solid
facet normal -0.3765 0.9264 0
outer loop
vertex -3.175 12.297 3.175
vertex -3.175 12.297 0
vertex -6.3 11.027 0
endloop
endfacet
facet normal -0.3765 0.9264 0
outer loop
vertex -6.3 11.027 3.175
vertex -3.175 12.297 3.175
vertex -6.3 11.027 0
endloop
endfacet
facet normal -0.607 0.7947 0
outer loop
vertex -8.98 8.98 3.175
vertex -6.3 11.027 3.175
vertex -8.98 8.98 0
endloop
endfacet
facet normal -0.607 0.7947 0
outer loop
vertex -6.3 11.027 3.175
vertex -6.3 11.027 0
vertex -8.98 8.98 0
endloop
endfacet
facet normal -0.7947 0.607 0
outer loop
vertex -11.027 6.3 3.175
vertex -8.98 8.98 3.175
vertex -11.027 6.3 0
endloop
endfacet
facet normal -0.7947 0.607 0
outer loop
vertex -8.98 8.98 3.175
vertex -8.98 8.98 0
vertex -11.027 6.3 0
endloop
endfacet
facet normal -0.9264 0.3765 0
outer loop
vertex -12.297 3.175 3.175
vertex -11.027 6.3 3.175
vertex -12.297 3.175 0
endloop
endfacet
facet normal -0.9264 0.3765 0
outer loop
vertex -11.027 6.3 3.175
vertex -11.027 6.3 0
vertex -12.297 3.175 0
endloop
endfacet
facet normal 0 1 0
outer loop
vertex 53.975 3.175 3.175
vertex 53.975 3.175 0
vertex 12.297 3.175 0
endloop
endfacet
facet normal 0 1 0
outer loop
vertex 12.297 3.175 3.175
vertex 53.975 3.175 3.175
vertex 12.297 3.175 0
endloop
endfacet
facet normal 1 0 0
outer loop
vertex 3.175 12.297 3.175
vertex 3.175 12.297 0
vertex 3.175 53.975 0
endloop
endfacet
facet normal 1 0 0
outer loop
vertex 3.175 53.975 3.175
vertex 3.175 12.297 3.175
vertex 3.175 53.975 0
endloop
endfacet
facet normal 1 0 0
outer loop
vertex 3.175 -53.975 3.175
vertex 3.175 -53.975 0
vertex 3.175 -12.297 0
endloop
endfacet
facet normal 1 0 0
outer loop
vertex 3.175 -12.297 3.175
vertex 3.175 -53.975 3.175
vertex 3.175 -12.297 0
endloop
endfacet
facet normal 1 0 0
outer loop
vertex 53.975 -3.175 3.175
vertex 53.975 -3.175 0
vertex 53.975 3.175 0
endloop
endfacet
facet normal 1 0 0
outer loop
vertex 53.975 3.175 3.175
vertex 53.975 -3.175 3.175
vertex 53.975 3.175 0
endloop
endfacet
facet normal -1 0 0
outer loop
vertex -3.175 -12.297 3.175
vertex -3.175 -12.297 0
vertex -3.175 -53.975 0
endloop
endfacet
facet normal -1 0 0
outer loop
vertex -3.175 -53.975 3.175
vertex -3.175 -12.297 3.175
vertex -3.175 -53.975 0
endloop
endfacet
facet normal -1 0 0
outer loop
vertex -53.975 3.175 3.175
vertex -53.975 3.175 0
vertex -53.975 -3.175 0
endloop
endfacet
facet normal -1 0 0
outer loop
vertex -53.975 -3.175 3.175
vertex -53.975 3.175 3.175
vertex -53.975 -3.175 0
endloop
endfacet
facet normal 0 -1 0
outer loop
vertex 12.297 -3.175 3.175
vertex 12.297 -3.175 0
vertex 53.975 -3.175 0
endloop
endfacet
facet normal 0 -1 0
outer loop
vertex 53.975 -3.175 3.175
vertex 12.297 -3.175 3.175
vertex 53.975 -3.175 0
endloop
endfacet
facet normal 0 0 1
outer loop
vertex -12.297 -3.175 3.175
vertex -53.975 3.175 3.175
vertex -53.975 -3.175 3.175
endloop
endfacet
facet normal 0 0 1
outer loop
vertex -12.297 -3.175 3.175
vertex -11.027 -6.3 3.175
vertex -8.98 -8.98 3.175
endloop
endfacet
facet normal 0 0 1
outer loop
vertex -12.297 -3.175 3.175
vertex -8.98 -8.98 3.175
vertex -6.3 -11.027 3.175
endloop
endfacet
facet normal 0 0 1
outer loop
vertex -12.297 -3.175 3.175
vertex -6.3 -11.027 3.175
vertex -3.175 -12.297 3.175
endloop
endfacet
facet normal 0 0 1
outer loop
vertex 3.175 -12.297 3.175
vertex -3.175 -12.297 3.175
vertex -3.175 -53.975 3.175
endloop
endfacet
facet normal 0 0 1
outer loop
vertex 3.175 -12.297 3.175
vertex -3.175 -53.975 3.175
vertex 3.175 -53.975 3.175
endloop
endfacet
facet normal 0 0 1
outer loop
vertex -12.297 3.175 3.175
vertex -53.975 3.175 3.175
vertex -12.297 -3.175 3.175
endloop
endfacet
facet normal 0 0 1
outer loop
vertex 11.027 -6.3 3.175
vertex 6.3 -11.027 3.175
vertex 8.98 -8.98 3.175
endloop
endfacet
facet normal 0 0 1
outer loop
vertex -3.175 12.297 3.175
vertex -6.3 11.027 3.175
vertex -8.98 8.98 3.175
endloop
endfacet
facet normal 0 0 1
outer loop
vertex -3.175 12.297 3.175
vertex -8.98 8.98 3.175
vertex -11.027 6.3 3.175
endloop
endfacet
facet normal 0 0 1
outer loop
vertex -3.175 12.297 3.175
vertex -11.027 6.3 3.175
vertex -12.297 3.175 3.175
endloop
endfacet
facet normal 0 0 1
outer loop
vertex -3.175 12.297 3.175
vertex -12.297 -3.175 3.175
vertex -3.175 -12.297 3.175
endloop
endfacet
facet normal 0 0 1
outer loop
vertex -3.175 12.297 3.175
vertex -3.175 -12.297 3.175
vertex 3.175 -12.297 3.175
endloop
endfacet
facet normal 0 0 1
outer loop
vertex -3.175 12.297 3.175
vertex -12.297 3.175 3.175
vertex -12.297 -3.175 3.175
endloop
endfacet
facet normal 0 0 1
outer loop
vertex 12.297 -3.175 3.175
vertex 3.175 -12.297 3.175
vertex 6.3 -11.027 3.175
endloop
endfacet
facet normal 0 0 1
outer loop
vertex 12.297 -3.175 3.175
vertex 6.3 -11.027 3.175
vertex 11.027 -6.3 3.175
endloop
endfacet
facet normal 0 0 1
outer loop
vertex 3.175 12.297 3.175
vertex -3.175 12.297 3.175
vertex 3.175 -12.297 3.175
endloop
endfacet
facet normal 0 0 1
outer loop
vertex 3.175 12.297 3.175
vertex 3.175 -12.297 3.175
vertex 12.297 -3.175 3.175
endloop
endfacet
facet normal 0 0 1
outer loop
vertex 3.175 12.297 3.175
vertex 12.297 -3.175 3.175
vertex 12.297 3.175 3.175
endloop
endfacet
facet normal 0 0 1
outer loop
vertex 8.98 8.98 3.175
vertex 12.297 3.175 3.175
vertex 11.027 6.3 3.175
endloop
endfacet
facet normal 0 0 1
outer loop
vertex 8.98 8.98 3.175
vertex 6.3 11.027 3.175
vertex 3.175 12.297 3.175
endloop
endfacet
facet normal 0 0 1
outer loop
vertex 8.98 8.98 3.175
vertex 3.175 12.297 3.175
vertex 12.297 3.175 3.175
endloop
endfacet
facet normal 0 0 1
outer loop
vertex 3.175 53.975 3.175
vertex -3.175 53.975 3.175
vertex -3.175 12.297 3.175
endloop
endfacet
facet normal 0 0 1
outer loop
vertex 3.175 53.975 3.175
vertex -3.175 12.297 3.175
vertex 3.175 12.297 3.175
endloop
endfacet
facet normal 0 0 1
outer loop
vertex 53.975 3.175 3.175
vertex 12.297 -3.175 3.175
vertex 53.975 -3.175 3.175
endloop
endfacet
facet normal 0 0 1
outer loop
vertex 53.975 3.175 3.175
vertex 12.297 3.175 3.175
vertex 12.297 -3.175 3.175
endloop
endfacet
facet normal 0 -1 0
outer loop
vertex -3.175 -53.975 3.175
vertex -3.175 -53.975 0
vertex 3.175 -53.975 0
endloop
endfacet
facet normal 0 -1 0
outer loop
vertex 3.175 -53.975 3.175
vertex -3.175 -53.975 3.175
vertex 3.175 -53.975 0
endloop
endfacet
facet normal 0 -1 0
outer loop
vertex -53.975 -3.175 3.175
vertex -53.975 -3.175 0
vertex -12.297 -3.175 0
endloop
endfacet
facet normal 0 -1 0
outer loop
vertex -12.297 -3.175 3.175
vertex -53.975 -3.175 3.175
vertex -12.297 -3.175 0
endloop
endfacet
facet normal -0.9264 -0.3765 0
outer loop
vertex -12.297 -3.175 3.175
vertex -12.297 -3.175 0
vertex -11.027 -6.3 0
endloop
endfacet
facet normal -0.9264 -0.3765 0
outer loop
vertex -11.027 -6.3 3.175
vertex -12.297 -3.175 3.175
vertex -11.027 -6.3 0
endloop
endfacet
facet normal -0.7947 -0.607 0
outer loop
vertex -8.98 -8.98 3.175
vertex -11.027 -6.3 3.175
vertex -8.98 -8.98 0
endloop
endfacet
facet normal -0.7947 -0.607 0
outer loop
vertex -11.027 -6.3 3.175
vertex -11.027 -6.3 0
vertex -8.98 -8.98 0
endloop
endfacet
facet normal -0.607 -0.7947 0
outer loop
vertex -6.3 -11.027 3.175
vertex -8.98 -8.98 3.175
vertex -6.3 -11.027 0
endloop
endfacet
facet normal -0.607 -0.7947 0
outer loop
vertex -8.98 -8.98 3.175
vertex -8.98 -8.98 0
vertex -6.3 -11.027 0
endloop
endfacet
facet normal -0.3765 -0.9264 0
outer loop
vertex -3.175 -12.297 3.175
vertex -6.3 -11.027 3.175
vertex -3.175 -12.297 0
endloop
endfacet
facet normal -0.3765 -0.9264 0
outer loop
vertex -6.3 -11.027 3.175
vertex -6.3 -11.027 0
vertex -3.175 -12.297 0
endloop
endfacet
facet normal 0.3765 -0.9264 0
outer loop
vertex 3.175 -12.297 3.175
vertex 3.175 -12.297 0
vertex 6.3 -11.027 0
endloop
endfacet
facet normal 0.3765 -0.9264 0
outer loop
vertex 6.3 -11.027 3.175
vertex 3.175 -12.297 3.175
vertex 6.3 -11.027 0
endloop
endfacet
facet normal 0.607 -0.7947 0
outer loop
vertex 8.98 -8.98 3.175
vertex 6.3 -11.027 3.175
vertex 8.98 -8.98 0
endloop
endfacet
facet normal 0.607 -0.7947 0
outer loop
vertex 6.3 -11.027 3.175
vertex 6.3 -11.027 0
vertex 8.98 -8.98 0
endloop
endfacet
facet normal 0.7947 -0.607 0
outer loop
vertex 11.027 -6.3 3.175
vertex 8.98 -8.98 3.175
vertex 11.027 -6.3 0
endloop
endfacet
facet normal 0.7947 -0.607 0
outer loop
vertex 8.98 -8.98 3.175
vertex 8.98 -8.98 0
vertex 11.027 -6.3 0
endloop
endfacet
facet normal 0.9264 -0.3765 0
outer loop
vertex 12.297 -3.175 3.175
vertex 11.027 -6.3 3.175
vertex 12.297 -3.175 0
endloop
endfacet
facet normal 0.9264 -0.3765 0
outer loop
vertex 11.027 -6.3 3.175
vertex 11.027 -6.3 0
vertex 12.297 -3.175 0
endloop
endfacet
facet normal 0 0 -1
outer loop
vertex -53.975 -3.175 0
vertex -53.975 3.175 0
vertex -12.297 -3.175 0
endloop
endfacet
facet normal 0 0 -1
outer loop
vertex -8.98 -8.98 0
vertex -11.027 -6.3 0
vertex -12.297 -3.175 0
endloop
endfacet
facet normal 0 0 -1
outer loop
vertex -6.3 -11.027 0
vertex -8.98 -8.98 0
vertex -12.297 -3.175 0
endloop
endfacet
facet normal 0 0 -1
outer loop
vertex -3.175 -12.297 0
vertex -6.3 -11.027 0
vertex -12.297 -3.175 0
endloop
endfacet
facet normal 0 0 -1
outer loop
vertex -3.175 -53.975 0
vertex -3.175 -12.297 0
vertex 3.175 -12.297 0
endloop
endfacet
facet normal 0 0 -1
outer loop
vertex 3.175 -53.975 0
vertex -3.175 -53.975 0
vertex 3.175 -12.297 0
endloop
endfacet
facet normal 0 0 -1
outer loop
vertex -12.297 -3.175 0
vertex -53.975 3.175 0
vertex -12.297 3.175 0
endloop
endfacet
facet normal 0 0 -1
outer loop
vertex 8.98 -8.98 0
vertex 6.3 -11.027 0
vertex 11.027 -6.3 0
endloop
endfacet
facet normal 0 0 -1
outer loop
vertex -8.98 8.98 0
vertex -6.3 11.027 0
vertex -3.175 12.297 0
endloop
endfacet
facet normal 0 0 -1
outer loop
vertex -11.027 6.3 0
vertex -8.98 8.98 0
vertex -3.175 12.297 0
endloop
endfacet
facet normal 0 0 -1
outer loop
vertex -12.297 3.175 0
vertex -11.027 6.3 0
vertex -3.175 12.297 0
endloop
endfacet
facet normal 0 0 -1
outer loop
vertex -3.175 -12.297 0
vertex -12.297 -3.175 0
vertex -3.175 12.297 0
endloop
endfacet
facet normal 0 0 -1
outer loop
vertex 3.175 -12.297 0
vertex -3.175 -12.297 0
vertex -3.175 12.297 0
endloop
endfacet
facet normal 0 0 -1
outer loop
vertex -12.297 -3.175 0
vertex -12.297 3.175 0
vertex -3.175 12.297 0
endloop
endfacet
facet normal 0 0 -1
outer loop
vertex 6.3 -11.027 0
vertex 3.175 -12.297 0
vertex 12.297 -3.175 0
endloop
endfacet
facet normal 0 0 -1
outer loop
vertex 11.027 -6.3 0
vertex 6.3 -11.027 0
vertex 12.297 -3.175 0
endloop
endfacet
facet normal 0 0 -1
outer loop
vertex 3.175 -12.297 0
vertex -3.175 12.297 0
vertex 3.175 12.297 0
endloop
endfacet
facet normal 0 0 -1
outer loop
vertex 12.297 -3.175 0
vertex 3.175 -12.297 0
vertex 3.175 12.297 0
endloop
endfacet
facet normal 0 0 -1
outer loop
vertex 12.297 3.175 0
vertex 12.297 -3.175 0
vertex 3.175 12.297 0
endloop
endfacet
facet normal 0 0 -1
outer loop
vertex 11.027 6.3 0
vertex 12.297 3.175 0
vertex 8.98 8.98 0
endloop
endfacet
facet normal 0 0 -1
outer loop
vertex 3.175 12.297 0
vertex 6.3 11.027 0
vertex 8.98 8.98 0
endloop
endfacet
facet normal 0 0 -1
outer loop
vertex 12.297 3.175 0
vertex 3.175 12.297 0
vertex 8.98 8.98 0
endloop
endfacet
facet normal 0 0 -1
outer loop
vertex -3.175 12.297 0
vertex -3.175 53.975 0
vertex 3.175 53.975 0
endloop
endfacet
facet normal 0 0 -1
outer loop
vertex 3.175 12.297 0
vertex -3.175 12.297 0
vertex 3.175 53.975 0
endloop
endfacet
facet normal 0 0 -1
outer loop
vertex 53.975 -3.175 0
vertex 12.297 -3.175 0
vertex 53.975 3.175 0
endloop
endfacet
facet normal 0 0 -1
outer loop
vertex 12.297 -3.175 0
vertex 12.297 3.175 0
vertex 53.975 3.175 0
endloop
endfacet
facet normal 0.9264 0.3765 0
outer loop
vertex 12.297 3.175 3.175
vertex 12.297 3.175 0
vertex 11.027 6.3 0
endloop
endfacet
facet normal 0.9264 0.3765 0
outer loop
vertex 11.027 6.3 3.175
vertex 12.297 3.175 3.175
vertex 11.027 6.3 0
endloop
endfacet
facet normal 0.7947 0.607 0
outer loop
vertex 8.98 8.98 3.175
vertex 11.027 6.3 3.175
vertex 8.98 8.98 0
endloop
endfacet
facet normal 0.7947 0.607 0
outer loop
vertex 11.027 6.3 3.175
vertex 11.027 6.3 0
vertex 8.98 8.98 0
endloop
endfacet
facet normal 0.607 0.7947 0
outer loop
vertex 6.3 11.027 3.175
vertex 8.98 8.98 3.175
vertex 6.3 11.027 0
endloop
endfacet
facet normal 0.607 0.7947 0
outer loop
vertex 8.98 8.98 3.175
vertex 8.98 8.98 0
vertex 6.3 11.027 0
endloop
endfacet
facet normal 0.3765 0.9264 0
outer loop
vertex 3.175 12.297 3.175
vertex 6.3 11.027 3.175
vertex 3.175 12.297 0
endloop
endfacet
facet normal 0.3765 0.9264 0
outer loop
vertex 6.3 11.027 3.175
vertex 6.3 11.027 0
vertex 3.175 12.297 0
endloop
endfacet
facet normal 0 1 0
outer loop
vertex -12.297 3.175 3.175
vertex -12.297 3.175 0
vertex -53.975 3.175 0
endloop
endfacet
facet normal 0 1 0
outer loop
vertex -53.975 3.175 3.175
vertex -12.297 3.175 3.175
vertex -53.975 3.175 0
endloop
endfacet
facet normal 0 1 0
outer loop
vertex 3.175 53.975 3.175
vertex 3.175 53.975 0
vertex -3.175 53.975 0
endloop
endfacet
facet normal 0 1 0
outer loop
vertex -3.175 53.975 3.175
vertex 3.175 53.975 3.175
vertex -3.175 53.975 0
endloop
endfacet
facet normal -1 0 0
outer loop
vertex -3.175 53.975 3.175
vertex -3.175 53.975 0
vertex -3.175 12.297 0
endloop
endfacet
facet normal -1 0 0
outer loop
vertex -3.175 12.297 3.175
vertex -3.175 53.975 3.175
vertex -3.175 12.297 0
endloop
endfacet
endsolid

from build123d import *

# Parameters (mm, degrees)
F0_W     = 6.35
F0_H     = 6.35
F1_DEPTH = 3.175


with BuildPart() as f1:
    # F0 (on Top) → F1 (new body)
    with BuildSketch(Plane.XY):
        with BuildLine():
            Line((-12.2967221242, 3.175), (-53.975, 3.175))
            Line((-53.975, 3.175), (-53.975, -3.175))
            Line((-53.975, -3.175), (-12.2967221242, -3.175))
            ThreePointArc((-12.2967221242, -3.175), (-12.7, 0), (-12.2967221242, 3.175))
        make_face()
        with BuildLine():
            Line((53.975, 3.175), (12.2967221242, 3.175))
            ThreePointArc((12.2967221242, 3.175), (12.5987771426, 1.6002545145), (12.7, 0))
            ThreePointArc((12.7, 0), (12.5987771426, -1.6002545145), (12.2967221242, -3.175))
            Line((12.2967221242, -3.175), (53.975, -3.175))
            Line((53.975, -3.175), (53.975, 3.175))
        make_face()
        with BuildLine():
            ThreePointArc((3.175, -12.2967221242), (0, -12.7), (-3.175, -12.2967221242))
            Line((-3.175, -12.2967221242), (-3.175, -53.975))
            Line((-3.175, -53.975), (3.175, -53.975))
            Line((3.175, -53.975), (3.175, -12.2967221242))
        make_face()
        with BuildLine():
            Line((-3.175, 53.975), (-3.175, 12.2967221242))
            ThreePointArc((-3.175, 12.2967221242), (0, 12.7), (3.175, 12.2967221242))
            Line((3.175, 12.2967221242), (3.175, 53.975))
            Line((3.175, 53.975), (-3.175, 53.975))
        make_face()
        with BuildLine():
            ThreePointArc((-3.175, 12.2967221242), (-8.9802561211, 8.9802561211), (-12.2967221242, 3.175))
            Line((-12.2967221242, 3.175), (-3.175, 3.175))
            Line((-3.175, 3.175), (-3.175, 12.2967221242))
        make_face()
        with BuildLine():
            Line((3.175, 12.2967221242), (3.175, 3.175))
            Line((3.175, 3.175), (12.2967221242, 3.175))
            ThreePointArc((12.2967221242, 3.175), (8.9802561211, 8.9802561211), (3.175, 12.2967221242))
        make_face()
        with BuildLine():
            Line((-3.175, -3.175), (-12.2967221242, -3.175))
            ThreePointArc((-12.2967221242, -3.175), (-8.9802561211, -8.9802561211), (-3.175, -12.2967221242))
            Line((-3.175, -12.2967221242), (-3.175, -3.175))
        make_face()
        with BuildLine():
            Line((12.2967221242, -3.175), (3.175, -3.175))
            Line((3.175, -3.175), (3.175, -12.2967221242))
            ThreePointArc((3.175, -12.2967221242), (8.9802561211, -8.9802561211), (12.2967221242, -3.175))
        make_face()
        with BuildLine():
            Line((-3.175, 3.175), (-12.2967221242, 3.175))
            ThreePointArc((-12.2967221242, 3.175), (-12.7, 0), (-12.2967221242, -3.175))
            Line((-12.2967221242, -3.175), (-3.175, -3.175))
            Line((-3.175, -3.175), (-3.175, 3.175))
        make_face()
        with BuildLine():
            Line((-3.175, 12.2967221242), (-3.175, 3.175))
            Line((-3.175, 3.175), (3.175, 3.175))
            Line((3.175, 3.175), (3.175, 12.2967221242))
            ThreePointArc((3.175, 12.2967221242), (0, 12.7), (-3.175, 12.2967221242))
        make_face()
        with BuildLine():
            Line((12.2967221242, 3.175), (3.175, 3.175))
            Line((3.175, 3.175), (3.175, -3.175))
            Line((3.175, -3.175), (12.2967221242, -3.175))
            ThreePointArc((12.2967221242, -3.175), (12.5987771426, -1.6002545145), (12.7, 0))
            ThreePointArc((12.7, 0), (12.5987771426, 1.6002545145), (12.2967221242, 3.175))
        make_face()
        with BuildLine():
            Line((3.175, -3.175), (-3.175, -3.175))
            Line((-3.175, -3.175), (-3.175, -12.2967221242))
            ThreePointArc((-3.175, -12.2967221242), (0, -12.7), (3.175, -12.2967221242))
            Line((3.175, -12.2967221242), (3.175, -3.175))
        make_face()
        Rectangle(F0_W, F0_H)
    extrude(amount=F1_DEPTH)


solid = f1.part
